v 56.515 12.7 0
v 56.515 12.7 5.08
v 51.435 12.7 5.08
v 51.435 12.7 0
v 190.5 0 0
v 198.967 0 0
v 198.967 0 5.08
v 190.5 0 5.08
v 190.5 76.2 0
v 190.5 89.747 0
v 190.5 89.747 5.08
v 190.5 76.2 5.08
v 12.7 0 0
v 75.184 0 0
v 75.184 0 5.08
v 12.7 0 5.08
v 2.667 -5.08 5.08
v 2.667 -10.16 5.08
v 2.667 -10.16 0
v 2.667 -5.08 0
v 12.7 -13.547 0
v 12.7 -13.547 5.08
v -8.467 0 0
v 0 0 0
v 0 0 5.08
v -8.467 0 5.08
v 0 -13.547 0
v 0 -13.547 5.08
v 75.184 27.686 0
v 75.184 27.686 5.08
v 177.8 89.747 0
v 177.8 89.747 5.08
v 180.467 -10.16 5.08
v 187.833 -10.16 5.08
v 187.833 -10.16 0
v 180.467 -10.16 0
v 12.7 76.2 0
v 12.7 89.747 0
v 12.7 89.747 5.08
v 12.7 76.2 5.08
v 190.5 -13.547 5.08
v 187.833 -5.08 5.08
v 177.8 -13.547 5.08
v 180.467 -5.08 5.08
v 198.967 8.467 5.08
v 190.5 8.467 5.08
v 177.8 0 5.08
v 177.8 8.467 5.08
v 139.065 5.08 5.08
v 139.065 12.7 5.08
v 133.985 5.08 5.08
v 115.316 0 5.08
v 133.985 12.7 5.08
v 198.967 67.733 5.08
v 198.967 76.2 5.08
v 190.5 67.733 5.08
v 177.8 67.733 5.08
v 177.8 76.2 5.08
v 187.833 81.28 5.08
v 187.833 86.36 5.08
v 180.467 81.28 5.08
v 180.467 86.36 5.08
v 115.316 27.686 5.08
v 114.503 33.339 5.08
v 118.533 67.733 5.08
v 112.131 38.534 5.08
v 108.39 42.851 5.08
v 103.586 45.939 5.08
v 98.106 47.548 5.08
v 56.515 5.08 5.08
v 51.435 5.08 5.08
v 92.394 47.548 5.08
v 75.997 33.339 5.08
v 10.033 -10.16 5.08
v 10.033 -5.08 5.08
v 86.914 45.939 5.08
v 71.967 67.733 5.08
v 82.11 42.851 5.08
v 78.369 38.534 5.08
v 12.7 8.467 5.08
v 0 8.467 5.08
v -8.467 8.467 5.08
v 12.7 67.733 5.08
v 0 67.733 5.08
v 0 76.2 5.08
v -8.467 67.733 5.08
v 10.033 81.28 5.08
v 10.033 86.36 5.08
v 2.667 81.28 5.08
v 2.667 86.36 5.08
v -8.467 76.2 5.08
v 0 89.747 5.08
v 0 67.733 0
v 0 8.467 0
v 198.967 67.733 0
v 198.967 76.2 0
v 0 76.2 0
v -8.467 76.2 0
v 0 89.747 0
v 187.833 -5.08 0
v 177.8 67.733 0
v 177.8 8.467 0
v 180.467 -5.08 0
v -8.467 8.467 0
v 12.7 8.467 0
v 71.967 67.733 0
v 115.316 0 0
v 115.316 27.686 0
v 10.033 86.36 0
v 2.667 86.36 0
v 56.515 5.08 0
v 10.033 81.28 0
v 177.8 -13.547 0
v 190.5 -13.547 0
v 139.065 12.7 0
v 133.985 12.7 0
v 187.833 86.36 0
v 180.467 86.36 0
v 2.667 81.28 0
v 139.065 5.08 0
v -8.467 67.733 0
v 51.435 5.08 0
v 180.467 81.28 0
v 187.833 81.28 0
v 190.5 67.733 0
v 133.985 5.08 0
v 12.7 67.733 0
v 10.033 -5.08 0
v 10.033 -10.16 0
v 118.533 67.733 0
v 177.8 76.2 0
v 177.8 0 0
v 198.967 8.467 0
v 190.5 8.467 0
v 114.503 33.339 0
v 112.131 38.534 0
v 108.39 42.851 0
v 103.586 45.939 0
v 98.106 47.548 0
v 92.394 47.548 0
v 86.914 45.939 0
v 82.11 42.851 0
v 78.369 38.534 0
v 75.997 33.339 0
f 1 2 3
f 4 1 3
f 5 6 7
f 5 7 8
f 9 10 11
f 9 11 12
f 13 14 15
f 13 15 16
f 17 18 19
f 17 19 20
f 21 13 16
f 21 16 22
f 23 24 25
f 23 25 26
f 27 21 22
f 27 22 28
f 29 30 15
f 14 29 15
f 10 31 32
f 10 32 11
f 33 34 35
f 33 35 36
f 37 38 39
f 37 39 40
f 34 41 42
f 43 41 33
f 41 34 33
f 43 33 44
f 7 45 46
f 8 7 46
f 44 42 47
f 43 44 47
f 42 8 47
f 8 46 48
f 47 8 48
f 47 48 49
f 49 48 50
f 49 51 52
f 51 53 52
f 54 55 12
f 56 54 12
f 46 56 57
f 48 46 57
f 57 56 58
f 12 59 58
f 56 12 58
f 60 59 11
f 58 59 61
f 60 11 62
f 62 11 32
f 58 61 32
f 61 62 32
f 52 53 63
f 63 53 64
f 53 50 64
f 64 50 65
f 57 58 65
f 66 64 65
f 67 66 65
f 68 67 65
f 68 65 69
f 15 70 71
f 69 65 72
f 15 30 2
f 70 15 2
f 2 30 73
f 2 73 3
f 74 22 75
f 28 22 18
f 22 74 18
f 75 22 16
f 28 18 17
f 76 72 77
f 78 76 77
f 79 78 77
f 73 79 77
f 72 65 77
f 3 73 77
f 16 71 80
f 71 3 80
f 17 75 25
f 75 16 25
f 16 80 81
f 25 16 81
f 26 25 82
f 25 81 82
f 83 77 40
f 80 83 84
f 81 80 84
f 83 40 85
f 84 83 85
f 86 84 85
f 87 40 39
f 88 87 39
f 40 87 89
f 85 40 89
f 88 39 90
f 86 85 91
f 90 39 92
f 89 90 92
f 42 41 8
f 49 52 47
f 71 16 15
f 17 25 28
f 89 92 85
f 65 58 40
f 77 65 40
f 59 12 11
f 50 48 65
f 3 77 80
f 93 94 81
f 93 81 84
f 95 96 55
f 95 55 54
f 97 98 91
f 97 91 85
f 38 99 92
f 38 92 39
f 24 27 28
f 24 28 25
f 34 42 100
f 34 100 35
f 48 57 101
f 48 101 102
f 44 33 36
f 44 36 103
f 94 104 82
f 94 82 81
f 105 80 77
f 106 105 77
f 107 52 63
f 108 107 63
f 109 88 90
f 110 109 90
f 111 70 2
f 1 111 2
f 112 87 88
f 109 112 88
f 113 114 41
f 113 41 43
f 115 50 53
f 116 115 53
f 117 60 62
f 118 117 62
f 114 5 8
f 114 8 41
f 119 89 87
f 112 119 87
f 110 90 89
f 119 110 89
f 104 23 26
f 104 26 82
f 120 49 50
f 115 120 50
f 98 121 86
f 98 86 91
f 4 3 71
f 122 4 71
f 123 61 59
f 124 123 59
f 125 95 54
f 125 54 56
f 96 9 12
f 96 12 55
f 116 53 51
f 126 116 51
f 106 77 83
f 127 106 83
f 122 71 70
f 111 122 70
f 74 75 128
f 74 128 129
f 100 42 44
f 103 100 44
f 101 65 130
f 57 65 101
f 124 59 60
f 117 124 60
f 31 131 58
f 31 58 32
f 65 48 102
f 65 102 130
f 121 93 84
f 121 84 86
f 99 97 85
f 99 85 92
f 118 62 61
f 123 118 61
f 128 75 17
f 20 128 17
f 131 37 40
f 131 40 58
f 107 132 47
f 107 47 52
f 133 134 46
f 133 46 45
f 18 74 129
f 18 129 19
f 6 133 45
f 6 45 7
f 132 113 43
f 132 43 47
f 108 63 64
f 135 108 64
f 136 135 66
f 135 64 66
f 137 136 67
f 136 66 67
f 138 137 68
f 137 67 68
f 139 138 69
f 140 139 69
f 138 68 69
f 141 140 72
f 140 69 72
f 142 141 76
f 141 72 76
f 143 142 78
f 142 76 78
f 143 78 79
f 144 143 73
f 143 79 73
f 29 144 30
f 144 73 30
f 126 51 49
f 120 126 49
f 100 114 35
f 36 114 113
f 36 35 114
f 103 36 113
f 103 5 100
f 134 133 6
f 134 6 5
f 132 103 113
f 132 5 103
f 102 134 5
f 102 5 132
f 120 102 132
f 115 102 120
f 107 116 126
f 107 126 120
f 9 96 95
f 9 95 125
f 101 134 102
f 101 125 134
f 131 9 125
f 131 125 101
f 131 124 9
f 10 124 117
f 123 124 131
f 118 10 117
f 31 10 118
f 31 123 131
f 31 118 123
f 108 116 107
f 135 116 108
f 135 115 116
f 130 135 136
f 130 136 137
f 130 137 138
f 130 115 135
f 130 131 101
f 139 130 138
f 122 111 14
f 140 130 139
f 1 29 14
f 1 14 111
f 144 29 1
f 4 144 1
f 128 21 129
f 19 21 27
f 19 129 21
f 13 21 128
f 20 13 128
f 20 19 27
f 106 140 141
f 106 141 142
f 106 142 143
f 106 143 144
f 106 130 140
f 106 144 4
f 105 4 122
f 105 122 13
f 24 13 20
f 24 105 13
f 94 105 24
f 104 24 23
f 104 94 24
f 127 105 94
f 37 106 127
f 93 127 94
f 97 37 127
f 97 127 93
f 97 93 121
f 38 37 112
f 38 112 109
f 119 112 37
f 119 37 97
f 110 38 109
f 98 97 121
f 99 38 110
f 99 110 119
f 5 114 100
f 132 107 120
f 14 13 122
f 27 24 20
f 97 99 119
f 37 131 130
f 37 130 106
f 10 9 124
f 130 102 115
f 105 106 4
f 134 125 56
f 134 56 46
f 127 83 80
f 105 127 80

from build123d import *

# Parameters (mm, degrees)
BOSS_EXTRUDE1_DEPTH = 5.08
CUT_EXTRUDE2_DEPTH  = 219.330036922
CUT_EXTRUDE4_DEPTH  = 219.330036922
CUT_EXTRUDE5_DEPTH  = 219.330036922
CUT_EXTRUDE6_DEPTH  = 219.330036922


with BuildPart() as part:
    # Sketch1 → Boss-Extrude1 (new body)
    with BuildSketch(Plane.XY):
        Polygon((198.966666667, 76.2), (198.966666667, 67.733333333), (190.5, 67.733333333), (190.5, 8.466666667), (198.966666667, 8.466666667), (198.966666667, 0), (190.5, 0), (190.5, -13.546666667), (177.8, -13.546666667), (177.8, 0), (12.7, 0), (12.7, -13.546666667), (0, -13.546666667), (0, 0), (-8.466666667, 0), (-8.466666667, 8.466666667), (0, 8.466666667), (0, 67.733333333), (-8.466666667, 67.733333333), (-8.466666667, 76.2), (0, 76.2), (0, 89.746666667), (12.7, 89.746666667), (12.7, 76.2), (177.8, 76.2), (177.8, 89.746666667), (190.5, 89.746666667), (190.5, 76.2), align=None)
    extrude(amount=BOSS_EXTRUDE1_DEPTH)

    # Sketch2 → Cut-Extrude2 (cut, through all)
    with BuildSketch(Plane.XY.offset(5.08)):
        with BuildLine():
            Line((95.25, 0), (115.316, 0))
            Line((115.316, 0), (115.316, 27.686))
            ThreePointArc((115.316, 27.686), (95.25, 47.752), (75.184, 27.686))
            Line((75.184, 27.686), (75.184, 0))
            Line((75.184, 0), (95.25, 0))
        make_face()
    extrude(amount=-CUT_EXTRUDE2_DEPTH, mode=Mode.SUBTRACT)

    # Sketch3 → Cut-Extrude4 (cut, through all)
    with BuildSketch(Plane.XY.offset(5.08)):
        Polygon((6.35, 81.28), (10.033, 81.28), (10.033, 86.36), (2.667, 86.36), (2.667, 81.28), align=None)
        Polygon((184.15, 81.28), (187.833, 81.28), (187.833, 86.36), (180.467, 86.36), (180.467, 81.28), align=None)
        Polygon((184.15, -5.08), (187.833, -5.08), (187.833, -10.16), (180.467, -10.16), (180.467, -5.08), align=None)
        Polygon((6.35, -5.08), (10.033, -5.08), (10.033, -10.16), (2.667, -10.16), (2.667, -5.08), align=None)
    extrude(amount=-CUT_EXTRUDE4_DEPTH, mode=Mode.SUBTRACT)

    # Sketch4 → Cut-Extrude5 (cut, through all)
    with BuildSketch(Plane.XY.offset(5.08)):
        Polygon((136.525, 5.08), (139.065, 5.08), (139.065, 12.7), (133.985, 12.7), (133.985, 5.08), align=None)
        Polygon((53.975, 5.08), (56.515, 5.08), (56.515, 12.7), (51.435, 12.7), (51.435, 5.08), align=None)
    extrude(amount=-CUT_EXTRUDE5_DEPTH, mode=Mode.SUBTRACT)

    # Sketch5 → Cut-Extrude6 (cut, through all)
    with BuildSketch(Plane.XY.offset(5.08)):
        Polygon((12.7, 67.733333333), (12.7, 8.466666667), (71.966666667, 67.733333333), align=None)
    cut_extrude6 = extrude(amount=-CUT_EXTRUDE6_DEPTH, mode=Mode.SUBTRACT)

    # Mirror1: Cut-Extrude6 across plane
    add(cut_extrude6.mirror(Plane(origin=(95.25, 0, 0), x_dir=(0, 0, 1), z_dir=(1, 0, 0))), mode=Mode.SUBTRACT)


solid = part.part
